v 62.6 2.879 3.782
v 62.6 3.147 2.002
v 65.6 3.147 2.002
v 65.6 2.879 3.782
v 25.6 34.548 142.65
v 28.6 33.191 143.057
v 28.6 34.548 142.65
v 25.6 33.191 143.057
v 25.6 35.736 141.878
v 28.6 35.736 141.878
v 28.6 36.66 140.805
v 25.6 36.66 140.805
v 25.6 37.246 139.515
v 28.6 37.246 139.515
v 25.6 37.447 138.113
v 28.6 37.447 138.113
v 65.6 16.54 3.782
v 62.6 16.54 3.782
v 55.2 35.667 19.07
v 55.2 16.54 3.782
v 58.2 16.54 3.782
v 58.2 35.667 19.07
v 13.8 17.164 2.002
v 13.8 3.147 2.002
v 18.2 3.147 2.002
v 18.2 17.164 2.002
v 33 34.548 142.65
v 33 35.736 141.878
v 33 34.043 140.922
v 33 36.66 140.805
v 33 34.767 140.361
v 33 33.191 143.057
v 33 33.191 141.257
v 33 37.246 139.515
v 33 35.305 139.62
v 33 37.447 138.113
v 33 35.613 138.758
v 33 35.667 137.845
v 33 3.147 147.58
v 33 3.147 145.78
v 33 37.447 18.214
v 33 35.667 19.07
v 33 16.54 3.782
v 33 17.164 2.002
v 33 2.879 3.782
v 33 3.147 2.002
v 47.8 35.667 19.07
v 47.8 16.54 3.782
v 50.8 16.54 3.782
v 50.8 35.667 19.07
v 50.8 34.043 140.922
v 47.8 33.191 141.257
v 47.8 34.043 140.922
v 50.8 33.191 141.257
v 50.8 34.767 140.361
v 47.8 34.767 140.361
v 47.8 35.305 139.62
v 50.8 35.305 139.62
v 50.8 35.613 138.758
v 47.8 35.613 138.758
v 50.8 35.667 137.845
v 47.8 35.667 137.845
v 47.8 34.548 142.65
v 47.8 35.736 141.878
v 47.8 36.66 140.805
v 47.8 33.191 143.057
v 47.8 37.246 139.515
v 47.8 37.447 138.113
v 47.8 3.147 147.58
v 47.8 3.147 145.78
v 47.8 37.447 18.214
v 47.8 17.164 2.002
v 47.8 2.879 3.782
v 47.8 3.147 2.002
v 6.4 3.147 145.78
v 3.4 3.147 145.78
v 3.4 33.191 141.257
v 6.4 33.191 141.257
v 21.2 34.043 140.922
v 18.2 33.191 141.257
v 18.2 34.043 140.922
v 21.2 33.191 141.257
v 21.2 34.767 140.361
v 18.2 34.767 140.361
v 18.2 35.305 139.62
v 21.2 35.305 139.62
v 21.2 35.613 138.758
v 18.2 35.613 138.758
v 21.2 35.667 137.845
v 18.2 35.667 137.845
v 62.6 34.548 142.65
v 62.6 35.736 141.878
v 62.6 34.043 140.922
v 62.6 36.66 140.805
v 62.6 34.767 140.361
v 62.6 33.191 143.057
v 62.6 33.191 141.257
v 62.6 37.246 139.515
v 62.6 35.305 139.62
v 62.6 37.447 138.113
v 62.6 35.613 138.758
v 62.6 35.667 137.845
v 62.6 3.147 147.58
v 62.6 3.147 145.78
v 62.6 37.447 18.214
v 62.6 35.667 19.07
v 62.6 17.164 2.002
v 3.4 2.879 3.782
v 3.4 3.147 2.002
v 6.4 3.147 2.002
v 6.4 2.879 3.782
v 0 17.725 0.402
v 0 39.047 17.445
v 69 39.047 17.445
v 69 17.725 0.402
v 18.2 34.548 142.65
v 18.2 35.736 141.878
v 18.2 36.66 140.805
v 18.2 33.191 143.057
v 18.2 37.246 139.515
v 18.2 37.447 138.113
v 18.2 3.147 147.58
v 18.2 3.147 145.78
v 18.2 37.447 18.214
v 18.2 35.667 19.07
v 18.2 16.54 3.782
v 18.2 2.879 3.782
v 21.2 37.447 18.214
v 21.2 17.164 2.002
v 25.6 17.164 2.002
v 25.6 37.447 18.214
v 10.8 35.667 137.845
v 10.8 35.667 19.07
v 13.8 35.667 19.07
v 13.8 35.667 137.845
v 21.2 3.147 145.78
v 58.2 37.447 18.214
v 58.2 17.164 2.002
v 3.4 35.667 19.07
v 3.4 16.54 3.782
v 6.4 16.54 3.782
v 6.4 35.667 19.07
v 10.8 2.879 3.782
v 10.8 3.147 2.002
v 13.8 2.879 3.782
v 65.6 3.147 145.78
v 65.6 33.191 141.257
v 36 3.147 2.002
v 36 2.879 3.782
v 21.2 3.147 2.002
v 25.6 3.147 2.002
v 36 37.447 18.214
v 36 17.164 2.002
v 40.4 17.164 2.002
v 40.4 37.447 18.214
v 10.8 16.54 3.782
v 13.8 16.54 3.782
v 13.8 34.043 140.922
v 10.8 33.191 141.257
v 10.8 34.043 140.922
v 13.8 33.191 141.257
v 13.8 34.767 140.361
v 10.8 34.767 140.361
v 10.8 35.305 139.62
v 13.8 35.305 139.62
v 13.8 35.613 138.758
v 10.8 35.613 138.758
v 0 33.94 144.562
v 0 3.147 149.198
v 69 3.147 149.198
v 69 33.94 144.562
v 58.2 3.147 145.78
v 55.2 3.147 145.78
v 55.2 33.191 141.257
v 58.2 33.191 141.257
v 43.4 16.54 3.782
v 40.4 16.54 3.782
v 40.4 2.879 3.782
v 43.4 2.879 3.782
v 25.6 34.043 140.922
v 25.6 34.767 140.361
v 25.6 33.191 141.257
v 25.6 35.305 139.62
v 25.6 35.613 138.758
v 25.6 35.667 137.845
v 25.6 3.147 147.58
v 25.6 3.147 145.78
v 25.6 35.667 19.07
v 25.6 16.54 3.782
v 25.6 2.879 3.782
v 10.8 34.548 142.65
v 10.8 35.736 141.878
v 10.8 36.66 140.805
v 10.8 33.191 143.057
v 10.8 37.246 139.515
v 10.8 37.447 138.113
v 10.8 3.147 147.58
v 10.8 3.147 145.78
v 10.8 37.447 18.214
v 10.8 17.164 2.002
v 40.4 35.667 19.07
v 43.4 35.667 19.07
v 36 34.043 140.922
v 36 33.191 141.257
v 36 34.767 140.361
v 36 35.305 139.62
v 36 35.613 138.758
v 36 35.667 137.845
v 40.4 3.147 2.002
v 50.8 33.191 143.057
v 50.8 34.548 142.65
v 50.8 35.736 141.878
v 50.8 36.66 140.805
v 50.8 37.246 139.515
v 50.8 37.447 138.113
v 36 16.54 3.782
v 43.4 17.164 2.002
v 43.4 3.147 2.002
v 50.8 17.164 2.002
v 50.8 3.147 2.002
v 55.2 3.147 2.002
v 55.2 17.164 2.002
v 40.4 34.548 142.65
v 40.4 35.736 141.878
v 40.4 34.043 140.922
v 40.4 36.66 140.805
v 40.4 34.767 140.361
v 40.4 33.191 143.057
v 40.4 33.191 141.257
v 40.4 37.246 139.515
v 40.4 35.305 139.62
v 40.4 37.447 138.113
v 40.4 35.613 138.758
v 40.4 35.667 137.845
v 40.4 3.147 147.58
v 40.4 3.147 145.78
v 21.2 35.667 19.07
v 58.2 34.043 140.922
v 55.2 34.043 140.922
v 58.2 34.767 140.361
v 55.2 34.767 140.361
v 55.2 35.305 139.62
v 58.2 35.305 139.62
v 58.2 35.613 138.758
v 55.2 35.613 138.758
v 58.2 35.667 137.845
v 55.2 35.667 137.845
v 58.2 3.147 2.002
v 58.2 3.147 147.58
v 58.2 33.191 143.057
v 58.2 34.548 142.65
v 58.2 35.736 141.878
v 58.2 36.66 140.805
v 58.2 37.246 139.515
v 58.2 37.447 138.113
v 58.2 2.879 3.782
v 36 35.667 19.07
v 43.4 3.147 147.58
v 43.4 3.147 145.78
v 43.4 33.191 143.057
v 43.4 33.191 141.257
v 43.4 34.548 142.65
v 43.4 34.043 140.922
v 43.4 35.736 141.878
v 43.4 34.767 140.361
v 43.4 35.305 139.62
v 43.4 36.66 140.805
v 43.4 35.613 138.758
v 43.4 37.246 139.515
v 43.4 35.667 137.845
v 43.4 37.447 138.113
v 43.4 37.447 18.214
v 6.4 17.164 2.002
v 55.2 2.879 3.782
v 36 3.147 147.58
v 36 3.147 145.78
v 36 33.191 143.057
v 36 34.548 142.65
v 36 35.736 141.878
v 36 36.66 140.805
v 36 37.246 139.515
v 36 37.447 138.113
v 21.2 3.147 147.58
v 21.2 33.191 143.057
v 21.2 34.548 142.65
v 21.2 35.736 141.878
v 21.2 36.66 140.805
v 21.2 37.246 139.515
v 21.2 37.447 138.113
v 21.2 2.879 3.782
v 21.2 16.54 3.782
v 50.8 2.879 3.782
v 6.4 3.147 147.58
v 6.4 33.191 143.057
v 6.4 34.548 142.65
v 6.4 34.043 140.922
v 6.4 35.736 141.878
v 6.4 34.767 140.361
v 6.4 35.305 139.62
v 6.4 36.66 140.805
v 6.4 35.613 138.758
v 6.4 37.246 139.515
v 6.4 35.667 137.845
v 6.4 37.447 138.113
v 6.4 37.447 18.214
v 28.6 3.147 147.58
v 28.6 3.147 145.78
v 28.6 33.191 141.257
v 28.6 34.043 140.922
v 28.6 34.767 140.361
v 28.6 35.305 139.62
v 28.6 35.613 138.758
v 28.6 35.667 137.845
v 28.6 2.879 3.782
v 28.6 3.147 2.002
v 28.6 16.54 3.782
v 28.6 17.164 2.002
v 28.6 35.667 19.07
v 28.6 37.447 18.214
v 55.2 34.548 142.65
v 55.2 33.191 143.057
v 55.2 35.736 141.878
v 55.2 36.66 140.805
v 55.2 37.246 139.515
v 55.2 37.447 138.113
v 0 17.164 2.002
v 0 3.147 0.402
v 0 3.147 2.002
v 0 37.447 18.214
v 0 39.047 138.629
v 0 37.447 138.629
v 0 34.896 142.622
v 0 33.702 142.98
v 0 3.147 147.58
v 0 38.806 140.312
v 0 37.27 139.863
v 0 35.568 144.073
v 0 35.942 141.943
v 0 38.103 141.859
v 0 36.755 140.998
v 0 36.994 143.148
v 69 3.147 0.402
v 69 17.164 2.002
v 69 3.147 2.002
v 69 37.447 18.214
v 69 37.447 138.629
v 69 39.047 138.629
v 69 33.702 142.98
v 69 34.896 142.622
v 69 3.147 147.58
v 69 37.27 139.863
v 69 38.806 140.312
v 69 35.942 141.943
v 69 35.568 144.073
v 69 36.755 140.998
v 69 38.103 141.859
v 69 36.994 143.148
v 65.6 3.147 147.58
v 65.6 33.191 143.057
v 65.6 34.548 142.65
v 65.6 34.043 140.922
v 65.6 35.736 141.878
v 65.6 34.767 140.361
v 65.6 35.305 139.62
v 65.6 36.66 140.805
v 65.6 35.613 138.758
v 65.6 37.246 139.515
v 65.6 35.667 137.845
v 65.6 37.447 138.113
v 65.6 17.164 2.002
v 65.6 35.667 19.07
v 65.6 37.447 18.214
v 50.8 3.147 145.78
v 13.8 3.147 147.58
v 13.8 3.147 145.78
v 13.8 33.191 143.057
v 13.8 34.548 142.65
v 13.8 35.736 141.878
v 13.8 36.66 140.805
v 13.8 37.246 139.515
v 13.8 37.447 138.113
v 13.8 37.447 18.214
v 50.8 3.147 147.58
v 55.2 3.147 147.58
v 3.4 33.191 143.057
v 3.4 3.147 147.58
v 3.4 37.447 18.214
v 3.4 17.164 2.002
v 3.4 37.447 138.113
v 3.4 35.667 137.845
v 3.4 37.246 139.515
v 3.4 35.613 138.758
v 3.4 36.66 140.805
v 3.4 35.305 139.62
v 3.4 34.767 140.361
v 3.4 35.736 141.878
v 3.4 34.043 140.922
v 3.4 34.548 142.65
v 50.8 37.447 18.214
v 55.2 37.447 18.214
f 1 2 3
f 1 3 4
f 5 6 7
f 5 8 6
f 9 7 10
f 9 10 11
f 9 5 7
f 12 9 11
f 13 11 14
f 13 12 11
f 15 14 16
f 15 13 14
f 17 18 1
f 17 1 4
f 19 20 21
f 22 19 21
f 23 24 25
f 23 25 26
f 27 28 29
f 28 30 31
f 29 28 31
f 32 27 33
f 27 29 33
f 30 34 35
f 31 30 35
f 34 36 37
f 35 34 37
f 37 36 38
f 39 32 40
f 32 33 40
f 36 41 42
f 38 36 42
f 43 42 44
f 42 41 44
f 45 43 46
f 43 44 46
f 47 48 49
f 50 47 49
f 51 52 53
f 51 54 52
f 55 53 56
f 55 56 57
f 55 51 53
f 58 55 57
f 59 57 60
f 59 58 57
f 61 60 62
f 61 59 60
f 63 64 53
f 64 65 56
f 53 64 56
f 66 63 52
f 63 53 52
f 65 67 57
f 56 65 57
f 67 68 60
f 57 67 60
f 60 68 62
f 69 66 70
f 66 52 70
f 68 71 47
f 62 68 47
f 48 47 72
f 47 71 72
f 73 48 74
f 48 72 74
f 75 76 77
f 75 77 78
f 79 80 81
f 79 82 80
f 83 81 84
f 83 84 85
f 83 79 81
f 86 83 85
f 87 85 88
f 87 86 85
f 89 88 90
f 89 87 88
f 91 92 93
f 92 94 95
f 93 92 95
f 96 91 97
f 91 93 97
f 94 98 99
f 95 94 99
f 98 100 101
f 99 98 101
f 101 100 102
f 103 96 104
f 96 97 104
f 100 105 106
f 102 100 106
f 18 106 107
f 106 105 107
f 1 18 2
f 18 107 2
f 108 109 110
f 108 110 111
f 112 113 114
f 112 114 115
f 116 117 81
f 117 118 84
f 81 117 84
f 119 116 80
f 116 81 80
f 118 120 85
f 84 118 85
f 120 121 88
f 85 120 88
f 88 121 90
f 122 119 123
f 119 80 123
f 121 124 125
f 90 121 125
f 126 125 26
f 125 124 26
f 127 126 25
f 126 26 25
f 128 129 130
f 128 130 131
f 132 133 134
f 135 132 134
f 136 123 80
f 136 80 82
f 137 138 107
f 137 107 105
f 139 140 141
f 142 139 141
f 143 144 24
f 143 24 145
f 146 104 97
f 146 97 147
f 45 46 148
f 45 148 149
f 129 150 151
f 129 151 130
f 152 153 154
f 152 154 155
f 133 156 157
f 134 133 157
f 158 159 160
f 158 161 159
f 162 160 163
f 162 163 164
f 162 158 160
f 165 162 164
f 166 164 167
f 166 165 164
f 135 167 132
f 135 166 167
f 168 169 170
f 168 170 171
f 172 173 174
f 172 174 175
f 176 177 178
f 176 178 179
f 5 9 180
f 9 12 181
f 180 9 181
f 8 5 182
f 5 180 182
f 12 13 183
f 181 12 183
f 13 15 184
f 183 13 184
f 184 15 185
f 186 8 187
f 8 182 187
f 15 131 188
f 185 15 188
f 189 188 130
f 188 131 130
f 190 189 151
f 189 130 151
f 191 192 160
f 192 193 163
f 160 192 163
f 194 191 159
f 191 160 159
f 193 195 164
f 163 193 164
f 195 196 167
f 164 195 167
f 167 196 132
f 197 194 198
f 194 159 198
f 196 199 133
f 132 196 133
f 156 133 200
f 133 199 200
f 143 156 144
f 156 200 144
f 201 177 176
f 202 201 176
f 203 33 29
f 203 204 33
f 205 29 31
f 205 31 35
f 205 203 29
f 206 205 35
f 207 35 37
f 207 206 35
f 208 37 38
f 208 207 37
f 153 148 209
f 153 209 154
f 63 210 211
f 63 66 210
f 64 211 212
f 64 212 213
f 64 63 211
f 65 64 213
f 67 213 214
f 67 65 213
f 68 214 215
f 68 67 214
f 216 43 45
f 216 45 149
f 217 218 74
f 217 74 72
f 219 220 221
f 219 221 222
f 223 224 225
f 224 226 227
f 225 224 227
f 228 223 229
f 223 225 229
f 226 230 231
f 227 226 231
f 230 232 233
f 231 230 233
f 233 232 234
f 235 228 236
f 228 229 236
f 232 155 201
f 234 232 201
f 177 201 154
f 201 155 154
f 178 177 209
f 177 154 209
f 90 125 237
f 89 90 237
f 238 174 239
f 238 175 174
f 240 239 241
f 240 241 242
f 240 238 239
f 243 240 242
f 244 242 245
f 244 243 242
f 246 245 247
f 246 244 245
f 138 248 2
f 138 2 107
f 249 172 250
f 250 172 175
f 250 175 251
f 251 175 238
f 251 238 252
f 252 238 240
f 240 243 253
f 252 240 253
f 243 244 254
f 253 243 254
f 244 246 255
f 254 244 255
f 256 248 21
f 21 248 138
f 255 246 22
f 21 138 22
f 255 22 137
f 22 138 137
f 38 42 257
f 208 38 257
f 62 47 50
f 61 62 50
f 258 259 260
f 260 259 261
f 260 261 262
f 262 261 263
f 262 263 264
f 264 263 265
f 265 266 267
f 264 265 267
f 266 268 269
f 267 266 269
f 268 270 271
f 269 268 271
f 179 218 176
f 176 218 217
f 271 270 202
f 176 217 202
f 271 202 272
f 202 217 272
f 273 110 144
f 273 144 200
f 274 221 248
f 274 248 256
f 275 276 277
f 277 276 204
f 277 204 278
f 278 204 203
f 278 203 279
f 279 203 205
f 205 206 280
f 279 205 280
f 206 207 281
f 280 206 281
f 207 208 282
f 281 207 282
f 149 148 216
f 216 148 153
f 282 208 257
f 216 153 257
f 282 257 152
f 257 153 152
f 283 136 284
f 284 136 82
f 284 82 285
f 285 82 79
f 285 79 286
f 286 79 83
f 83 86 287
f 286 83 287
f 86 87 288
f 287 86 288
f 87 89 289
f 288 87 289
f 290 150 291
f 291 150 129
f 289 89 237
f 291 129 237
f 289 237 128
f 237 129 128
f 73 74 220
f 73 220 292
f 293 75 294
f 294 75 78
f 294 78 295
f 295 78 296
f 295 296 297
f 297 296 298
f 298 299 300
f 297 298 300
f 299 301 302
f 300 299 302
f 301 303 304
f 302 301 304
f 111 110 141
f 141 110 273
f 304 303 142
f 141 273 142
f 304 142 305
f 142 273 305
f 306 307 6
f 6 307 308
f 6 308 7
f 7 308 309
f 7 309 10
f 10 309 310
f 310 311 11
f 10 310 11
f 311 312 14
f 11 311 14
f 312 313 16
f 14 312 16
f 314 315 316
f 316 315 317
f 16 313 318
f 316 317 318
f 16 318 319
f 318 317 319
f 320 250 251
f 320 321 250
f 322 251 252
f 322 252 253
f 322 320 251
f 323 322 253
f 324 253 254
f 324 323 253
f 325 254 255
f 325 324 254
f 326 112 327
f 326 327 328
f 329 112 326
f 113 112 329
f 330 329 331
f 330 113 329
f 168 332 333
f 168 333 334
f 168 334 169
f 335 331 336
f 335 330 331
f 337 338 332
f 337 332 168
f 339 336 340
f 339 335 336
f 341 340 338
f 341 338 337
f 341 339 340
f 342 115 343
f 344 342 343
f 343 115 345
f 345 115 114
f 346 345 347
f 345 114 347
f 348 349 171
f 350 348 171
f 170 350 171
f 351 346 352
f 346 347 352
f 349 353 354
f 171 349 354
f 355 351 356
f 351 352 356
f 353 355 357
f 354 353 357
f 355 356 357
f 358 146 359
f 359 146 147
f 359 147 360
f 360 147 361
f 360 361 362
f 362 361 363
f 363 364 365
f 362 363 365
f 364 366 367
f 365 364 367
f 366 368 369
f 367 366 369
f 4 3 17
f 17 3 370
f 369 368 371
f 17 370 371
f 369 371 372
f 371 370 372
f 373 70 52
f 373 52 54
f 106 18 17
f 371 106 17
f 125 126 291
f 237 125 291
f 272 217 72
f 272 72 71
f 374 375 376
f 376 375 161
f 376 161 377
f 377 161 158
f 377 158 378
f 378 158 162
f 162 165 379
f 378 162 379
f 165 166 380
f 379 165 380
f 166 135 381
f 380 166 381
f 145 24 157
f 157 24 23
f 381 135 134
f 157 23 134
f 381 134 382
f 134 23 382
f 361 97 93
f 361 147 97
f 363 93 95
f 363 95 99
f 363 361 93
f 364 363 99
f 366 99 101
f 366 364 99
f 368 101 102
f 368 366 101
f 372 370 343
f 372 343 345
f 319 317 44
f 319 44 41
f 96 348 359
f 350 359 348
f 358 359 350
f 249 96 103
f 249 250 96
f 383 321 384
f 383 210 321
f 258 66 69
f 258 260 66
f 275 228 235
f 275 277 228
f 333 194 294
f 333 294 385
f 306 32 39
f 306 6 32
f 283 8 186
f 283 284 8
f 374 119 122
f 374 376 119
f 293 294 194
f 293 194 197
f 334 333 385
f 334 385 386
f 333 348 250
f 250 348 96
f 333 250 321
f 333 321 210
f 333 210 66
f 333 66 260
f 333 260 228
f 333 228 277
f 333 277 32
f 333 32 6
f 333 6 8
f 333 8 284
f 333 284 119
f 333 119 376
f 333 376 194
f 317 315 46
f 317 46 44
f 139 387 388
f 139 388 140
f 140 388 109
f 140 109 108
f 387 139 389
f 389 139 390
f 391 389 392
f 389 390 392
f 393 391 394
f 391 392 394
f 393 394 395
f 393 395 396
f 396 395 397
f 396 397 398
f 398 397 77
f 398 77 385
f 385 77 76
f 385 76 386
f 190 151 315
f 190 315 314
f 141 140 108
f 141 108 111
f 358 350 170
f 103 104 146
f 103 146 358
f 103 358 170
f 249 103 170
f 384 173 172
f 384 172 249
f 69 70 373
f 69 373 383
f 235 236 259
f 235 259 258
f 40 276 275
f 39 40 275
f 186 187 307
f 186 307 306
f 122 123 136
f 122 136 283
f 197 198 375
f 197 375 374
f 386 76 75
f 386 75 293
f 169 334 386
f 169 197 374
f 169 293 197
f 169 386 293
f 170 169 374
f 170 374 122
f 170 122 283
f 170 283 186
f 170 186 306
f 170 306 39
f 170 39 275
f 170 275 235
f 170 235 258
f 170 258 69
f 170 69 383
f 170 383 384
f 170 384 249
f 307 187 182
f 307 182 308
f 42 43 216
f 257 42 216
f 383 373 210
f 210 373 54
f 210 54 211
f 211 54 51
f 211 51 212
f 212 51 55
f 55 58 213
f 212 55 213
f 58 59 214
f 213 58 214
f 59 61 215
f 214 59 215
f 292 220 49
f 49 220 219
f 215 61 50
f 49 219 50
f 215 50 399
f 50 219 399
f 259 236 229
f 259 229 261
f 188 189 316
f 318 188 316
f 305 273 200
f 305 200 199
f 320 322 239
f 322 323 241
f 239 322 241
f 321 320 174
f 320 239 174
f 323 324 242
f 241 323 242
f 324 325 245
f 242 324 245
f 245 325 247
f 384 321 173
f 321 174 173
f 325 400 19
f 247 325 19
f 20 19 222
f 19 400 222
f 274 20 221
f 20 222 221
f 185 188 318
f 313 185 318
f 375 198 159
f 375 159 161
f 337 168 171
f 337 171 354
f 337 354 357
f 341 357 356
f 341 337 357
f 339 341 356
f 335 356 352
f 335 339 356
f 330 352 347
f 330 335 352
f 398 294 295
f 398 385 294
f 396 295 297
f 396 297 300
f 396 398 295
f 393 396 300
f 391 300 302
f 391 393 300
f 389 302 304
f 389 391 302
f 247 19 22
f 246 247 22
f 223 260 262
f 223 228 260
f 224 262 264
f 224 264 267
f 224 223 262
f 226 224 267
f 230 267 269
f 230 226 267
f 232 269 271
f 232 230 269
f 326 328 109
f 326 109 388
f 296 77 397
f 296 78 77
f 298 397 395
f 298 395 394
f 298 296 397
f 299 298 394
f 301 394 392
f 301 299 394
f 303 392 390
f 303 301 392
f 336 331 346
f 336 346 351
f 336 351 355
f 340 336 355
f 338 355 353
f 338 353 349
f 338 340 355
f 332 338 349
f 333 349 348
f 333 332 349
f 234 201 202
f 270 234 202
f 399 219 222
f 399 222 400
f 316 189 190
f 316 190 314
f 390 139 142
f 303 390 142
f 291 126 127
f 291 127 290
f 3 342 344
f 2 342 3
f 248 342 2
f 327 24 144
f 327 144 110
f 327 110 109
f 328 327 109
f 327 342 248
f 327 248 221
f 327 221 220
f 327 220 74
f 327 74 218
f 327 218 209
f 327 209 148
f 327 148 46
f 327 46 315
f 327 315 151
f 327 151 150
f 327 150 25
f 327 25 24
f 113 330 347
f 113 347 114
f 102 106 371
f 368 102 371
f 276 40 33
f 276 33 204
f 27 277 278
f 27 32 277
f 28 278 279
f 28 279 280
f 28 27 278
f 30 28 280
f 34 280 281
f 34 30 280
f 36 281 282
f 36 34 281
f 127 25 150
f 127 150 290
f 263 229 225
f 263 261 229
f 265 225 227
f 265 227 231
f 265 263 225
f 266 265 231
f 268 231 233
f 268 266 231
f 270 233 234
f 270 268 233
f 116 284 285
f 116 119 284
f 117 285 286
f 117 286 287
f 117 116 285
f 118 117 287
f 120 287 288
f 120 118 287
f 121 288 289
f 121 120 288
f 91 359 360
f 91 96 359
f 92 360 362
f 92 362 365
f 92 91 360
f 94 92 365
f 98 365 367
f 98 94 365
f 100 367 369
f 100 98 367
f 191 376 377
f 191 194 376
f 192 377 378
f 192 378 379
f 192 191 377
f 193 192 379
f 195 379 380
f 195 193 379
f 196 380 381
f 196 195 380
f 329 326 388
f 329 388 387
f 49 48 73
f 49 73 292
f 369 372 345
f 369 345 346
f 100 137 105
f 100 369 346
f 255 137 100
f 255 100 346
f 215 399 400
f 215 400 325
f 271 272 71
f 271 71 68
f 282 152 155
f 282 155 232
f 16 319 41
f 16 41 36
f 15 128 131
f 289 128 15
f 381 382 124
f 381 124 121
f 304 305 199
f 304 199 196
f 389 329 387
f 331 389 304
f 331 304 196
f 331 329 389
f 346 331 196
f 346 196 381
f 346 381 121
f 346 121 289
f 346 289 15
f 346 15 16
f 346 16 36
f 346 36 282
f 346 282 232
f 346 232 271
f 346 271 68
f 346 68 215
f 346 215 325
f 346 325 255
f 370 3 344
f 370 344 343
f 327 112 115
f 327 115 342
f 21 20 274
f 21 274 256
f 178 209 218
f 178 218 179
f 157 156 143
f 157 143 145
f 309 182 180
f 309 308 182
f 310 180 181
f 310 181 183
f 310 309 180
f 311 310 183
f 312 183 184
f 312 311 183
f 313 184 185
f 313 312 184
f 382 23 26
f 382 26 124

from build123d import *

# Parameters (mm, degrees)
EXTRUDE_1_DEPTH = 69
SKETCH_7_W      = 3
SKETCH_7_H      = 1.8


with BuildPart() as part:
    # 草图2 → 凸台-拉伸1 (new body)
    with BuildSketch(Plane(origin=(0, 0, 0), x_dir=(0, 0, -1), z_dir=(1, 0, 0))):
        with BuildLine():
            Line((-2.001625282, 3.147074334), (-2.001625282, 17.164444968))
            Line((-2.001625282, 17.164444968), (-18.214026207, 37.447074334))
            Line((-18.214026207, 37.447074334), (-138.628938569, 37.447074334))
            ThreePointArc((-138.628938569, 37.447074334), (-141.499289796, 36.38190324), (-142.979906861, 33.70211244))
            Line((-142.979906861, 33.70211244), (-147.579966657, 3.147074334))
            Line((-147.579966657, 3.147074334), (-149.197997295, 3.147074334))
            Line((-149.197997295, 3.147074334), (-144.562077149, 33.940308116))
            ThreePointArc((-144.562077149, 33.940308116), (-142.543053879, 37.594568297), (-138.628938569, 39.047074334))
            Line((-138.628938569, 39.047074334), (-17.444620599, 39.047074334))
            Line((-17.444620599, 39.047074334), (-0.401625282, 17.725324466))
            Line((-0.401625282, 17.725324466), (-0.401625282, 3.147074334))
            Line((-0.401625282, 3.147074334), (-2.001625282, 3.147074334))
        make_face()
    extrude(amount=EXTRUDE_1_DEPTH)

    # 扫描1: sweep along a path in 草图17
    with BuildLine(Plane.ZY) as sweep_1_path:
        Line((147.579966657, 3.147074334), (143.056789207, 33.191435819))
        ThreePointArc((143.056789207, 33.191435819), (141.374269815, 36.236652636), (138.112507057, 37.447074334))
        Line((138.112507057, 37.447074334), (18.214026207, 37.447074334))
        Line((18.214026207, 37.447074334), (2.001625282, 17.164444968))
        Line((2.001625282, 17.164444968), (2.001625282, 3.147074334))
    # 草图7 → 扫描1 (sweep)
    with BuildSketch(Plane.XZ.offset(-3.147074334)):
        with Locations((34.5, 146.679966657)):
            Rectangle(SKETCH_7_W, SKETCH_7_H)
        with Locations((27.1, 146.679966657)):
            Rectangle(SKETCH_7_W, SKETCH_7_H)
        with Locations((19.7, 146.679966657)):
            Rectangle(SKETCH_7_W, SKETCH_7_H)
        with Locations((12.3, 146.679966657)):
            Rectangle(SKETCH_7_W, SKETCH_7_H)
        with Locations((4.9, 146.679966657)):
            Rectangle(SKETCH_7_W, SKETCH_7_H)
        with Locations((41.9, 146.679966657)):
            Rectangle(SKETCH_7_W, SKETCH_7_H)
        with Locations((49.3, 146.679966657)):
            Rectangle(SKETCH_7_W, SKETCH_7_H)
        with Locations((56.7, 146.679966657)):
            Rectangle(SKETCH_7_W, SKETCH_7_H)
        with Locations((64.1, 146.679966657)):
            Rectangle(SKETCH_7_W, SKETCH_7_H)
    sweep(path=sweep_1_path.line, transition=Transition.RIGHT)


solid = part.part
